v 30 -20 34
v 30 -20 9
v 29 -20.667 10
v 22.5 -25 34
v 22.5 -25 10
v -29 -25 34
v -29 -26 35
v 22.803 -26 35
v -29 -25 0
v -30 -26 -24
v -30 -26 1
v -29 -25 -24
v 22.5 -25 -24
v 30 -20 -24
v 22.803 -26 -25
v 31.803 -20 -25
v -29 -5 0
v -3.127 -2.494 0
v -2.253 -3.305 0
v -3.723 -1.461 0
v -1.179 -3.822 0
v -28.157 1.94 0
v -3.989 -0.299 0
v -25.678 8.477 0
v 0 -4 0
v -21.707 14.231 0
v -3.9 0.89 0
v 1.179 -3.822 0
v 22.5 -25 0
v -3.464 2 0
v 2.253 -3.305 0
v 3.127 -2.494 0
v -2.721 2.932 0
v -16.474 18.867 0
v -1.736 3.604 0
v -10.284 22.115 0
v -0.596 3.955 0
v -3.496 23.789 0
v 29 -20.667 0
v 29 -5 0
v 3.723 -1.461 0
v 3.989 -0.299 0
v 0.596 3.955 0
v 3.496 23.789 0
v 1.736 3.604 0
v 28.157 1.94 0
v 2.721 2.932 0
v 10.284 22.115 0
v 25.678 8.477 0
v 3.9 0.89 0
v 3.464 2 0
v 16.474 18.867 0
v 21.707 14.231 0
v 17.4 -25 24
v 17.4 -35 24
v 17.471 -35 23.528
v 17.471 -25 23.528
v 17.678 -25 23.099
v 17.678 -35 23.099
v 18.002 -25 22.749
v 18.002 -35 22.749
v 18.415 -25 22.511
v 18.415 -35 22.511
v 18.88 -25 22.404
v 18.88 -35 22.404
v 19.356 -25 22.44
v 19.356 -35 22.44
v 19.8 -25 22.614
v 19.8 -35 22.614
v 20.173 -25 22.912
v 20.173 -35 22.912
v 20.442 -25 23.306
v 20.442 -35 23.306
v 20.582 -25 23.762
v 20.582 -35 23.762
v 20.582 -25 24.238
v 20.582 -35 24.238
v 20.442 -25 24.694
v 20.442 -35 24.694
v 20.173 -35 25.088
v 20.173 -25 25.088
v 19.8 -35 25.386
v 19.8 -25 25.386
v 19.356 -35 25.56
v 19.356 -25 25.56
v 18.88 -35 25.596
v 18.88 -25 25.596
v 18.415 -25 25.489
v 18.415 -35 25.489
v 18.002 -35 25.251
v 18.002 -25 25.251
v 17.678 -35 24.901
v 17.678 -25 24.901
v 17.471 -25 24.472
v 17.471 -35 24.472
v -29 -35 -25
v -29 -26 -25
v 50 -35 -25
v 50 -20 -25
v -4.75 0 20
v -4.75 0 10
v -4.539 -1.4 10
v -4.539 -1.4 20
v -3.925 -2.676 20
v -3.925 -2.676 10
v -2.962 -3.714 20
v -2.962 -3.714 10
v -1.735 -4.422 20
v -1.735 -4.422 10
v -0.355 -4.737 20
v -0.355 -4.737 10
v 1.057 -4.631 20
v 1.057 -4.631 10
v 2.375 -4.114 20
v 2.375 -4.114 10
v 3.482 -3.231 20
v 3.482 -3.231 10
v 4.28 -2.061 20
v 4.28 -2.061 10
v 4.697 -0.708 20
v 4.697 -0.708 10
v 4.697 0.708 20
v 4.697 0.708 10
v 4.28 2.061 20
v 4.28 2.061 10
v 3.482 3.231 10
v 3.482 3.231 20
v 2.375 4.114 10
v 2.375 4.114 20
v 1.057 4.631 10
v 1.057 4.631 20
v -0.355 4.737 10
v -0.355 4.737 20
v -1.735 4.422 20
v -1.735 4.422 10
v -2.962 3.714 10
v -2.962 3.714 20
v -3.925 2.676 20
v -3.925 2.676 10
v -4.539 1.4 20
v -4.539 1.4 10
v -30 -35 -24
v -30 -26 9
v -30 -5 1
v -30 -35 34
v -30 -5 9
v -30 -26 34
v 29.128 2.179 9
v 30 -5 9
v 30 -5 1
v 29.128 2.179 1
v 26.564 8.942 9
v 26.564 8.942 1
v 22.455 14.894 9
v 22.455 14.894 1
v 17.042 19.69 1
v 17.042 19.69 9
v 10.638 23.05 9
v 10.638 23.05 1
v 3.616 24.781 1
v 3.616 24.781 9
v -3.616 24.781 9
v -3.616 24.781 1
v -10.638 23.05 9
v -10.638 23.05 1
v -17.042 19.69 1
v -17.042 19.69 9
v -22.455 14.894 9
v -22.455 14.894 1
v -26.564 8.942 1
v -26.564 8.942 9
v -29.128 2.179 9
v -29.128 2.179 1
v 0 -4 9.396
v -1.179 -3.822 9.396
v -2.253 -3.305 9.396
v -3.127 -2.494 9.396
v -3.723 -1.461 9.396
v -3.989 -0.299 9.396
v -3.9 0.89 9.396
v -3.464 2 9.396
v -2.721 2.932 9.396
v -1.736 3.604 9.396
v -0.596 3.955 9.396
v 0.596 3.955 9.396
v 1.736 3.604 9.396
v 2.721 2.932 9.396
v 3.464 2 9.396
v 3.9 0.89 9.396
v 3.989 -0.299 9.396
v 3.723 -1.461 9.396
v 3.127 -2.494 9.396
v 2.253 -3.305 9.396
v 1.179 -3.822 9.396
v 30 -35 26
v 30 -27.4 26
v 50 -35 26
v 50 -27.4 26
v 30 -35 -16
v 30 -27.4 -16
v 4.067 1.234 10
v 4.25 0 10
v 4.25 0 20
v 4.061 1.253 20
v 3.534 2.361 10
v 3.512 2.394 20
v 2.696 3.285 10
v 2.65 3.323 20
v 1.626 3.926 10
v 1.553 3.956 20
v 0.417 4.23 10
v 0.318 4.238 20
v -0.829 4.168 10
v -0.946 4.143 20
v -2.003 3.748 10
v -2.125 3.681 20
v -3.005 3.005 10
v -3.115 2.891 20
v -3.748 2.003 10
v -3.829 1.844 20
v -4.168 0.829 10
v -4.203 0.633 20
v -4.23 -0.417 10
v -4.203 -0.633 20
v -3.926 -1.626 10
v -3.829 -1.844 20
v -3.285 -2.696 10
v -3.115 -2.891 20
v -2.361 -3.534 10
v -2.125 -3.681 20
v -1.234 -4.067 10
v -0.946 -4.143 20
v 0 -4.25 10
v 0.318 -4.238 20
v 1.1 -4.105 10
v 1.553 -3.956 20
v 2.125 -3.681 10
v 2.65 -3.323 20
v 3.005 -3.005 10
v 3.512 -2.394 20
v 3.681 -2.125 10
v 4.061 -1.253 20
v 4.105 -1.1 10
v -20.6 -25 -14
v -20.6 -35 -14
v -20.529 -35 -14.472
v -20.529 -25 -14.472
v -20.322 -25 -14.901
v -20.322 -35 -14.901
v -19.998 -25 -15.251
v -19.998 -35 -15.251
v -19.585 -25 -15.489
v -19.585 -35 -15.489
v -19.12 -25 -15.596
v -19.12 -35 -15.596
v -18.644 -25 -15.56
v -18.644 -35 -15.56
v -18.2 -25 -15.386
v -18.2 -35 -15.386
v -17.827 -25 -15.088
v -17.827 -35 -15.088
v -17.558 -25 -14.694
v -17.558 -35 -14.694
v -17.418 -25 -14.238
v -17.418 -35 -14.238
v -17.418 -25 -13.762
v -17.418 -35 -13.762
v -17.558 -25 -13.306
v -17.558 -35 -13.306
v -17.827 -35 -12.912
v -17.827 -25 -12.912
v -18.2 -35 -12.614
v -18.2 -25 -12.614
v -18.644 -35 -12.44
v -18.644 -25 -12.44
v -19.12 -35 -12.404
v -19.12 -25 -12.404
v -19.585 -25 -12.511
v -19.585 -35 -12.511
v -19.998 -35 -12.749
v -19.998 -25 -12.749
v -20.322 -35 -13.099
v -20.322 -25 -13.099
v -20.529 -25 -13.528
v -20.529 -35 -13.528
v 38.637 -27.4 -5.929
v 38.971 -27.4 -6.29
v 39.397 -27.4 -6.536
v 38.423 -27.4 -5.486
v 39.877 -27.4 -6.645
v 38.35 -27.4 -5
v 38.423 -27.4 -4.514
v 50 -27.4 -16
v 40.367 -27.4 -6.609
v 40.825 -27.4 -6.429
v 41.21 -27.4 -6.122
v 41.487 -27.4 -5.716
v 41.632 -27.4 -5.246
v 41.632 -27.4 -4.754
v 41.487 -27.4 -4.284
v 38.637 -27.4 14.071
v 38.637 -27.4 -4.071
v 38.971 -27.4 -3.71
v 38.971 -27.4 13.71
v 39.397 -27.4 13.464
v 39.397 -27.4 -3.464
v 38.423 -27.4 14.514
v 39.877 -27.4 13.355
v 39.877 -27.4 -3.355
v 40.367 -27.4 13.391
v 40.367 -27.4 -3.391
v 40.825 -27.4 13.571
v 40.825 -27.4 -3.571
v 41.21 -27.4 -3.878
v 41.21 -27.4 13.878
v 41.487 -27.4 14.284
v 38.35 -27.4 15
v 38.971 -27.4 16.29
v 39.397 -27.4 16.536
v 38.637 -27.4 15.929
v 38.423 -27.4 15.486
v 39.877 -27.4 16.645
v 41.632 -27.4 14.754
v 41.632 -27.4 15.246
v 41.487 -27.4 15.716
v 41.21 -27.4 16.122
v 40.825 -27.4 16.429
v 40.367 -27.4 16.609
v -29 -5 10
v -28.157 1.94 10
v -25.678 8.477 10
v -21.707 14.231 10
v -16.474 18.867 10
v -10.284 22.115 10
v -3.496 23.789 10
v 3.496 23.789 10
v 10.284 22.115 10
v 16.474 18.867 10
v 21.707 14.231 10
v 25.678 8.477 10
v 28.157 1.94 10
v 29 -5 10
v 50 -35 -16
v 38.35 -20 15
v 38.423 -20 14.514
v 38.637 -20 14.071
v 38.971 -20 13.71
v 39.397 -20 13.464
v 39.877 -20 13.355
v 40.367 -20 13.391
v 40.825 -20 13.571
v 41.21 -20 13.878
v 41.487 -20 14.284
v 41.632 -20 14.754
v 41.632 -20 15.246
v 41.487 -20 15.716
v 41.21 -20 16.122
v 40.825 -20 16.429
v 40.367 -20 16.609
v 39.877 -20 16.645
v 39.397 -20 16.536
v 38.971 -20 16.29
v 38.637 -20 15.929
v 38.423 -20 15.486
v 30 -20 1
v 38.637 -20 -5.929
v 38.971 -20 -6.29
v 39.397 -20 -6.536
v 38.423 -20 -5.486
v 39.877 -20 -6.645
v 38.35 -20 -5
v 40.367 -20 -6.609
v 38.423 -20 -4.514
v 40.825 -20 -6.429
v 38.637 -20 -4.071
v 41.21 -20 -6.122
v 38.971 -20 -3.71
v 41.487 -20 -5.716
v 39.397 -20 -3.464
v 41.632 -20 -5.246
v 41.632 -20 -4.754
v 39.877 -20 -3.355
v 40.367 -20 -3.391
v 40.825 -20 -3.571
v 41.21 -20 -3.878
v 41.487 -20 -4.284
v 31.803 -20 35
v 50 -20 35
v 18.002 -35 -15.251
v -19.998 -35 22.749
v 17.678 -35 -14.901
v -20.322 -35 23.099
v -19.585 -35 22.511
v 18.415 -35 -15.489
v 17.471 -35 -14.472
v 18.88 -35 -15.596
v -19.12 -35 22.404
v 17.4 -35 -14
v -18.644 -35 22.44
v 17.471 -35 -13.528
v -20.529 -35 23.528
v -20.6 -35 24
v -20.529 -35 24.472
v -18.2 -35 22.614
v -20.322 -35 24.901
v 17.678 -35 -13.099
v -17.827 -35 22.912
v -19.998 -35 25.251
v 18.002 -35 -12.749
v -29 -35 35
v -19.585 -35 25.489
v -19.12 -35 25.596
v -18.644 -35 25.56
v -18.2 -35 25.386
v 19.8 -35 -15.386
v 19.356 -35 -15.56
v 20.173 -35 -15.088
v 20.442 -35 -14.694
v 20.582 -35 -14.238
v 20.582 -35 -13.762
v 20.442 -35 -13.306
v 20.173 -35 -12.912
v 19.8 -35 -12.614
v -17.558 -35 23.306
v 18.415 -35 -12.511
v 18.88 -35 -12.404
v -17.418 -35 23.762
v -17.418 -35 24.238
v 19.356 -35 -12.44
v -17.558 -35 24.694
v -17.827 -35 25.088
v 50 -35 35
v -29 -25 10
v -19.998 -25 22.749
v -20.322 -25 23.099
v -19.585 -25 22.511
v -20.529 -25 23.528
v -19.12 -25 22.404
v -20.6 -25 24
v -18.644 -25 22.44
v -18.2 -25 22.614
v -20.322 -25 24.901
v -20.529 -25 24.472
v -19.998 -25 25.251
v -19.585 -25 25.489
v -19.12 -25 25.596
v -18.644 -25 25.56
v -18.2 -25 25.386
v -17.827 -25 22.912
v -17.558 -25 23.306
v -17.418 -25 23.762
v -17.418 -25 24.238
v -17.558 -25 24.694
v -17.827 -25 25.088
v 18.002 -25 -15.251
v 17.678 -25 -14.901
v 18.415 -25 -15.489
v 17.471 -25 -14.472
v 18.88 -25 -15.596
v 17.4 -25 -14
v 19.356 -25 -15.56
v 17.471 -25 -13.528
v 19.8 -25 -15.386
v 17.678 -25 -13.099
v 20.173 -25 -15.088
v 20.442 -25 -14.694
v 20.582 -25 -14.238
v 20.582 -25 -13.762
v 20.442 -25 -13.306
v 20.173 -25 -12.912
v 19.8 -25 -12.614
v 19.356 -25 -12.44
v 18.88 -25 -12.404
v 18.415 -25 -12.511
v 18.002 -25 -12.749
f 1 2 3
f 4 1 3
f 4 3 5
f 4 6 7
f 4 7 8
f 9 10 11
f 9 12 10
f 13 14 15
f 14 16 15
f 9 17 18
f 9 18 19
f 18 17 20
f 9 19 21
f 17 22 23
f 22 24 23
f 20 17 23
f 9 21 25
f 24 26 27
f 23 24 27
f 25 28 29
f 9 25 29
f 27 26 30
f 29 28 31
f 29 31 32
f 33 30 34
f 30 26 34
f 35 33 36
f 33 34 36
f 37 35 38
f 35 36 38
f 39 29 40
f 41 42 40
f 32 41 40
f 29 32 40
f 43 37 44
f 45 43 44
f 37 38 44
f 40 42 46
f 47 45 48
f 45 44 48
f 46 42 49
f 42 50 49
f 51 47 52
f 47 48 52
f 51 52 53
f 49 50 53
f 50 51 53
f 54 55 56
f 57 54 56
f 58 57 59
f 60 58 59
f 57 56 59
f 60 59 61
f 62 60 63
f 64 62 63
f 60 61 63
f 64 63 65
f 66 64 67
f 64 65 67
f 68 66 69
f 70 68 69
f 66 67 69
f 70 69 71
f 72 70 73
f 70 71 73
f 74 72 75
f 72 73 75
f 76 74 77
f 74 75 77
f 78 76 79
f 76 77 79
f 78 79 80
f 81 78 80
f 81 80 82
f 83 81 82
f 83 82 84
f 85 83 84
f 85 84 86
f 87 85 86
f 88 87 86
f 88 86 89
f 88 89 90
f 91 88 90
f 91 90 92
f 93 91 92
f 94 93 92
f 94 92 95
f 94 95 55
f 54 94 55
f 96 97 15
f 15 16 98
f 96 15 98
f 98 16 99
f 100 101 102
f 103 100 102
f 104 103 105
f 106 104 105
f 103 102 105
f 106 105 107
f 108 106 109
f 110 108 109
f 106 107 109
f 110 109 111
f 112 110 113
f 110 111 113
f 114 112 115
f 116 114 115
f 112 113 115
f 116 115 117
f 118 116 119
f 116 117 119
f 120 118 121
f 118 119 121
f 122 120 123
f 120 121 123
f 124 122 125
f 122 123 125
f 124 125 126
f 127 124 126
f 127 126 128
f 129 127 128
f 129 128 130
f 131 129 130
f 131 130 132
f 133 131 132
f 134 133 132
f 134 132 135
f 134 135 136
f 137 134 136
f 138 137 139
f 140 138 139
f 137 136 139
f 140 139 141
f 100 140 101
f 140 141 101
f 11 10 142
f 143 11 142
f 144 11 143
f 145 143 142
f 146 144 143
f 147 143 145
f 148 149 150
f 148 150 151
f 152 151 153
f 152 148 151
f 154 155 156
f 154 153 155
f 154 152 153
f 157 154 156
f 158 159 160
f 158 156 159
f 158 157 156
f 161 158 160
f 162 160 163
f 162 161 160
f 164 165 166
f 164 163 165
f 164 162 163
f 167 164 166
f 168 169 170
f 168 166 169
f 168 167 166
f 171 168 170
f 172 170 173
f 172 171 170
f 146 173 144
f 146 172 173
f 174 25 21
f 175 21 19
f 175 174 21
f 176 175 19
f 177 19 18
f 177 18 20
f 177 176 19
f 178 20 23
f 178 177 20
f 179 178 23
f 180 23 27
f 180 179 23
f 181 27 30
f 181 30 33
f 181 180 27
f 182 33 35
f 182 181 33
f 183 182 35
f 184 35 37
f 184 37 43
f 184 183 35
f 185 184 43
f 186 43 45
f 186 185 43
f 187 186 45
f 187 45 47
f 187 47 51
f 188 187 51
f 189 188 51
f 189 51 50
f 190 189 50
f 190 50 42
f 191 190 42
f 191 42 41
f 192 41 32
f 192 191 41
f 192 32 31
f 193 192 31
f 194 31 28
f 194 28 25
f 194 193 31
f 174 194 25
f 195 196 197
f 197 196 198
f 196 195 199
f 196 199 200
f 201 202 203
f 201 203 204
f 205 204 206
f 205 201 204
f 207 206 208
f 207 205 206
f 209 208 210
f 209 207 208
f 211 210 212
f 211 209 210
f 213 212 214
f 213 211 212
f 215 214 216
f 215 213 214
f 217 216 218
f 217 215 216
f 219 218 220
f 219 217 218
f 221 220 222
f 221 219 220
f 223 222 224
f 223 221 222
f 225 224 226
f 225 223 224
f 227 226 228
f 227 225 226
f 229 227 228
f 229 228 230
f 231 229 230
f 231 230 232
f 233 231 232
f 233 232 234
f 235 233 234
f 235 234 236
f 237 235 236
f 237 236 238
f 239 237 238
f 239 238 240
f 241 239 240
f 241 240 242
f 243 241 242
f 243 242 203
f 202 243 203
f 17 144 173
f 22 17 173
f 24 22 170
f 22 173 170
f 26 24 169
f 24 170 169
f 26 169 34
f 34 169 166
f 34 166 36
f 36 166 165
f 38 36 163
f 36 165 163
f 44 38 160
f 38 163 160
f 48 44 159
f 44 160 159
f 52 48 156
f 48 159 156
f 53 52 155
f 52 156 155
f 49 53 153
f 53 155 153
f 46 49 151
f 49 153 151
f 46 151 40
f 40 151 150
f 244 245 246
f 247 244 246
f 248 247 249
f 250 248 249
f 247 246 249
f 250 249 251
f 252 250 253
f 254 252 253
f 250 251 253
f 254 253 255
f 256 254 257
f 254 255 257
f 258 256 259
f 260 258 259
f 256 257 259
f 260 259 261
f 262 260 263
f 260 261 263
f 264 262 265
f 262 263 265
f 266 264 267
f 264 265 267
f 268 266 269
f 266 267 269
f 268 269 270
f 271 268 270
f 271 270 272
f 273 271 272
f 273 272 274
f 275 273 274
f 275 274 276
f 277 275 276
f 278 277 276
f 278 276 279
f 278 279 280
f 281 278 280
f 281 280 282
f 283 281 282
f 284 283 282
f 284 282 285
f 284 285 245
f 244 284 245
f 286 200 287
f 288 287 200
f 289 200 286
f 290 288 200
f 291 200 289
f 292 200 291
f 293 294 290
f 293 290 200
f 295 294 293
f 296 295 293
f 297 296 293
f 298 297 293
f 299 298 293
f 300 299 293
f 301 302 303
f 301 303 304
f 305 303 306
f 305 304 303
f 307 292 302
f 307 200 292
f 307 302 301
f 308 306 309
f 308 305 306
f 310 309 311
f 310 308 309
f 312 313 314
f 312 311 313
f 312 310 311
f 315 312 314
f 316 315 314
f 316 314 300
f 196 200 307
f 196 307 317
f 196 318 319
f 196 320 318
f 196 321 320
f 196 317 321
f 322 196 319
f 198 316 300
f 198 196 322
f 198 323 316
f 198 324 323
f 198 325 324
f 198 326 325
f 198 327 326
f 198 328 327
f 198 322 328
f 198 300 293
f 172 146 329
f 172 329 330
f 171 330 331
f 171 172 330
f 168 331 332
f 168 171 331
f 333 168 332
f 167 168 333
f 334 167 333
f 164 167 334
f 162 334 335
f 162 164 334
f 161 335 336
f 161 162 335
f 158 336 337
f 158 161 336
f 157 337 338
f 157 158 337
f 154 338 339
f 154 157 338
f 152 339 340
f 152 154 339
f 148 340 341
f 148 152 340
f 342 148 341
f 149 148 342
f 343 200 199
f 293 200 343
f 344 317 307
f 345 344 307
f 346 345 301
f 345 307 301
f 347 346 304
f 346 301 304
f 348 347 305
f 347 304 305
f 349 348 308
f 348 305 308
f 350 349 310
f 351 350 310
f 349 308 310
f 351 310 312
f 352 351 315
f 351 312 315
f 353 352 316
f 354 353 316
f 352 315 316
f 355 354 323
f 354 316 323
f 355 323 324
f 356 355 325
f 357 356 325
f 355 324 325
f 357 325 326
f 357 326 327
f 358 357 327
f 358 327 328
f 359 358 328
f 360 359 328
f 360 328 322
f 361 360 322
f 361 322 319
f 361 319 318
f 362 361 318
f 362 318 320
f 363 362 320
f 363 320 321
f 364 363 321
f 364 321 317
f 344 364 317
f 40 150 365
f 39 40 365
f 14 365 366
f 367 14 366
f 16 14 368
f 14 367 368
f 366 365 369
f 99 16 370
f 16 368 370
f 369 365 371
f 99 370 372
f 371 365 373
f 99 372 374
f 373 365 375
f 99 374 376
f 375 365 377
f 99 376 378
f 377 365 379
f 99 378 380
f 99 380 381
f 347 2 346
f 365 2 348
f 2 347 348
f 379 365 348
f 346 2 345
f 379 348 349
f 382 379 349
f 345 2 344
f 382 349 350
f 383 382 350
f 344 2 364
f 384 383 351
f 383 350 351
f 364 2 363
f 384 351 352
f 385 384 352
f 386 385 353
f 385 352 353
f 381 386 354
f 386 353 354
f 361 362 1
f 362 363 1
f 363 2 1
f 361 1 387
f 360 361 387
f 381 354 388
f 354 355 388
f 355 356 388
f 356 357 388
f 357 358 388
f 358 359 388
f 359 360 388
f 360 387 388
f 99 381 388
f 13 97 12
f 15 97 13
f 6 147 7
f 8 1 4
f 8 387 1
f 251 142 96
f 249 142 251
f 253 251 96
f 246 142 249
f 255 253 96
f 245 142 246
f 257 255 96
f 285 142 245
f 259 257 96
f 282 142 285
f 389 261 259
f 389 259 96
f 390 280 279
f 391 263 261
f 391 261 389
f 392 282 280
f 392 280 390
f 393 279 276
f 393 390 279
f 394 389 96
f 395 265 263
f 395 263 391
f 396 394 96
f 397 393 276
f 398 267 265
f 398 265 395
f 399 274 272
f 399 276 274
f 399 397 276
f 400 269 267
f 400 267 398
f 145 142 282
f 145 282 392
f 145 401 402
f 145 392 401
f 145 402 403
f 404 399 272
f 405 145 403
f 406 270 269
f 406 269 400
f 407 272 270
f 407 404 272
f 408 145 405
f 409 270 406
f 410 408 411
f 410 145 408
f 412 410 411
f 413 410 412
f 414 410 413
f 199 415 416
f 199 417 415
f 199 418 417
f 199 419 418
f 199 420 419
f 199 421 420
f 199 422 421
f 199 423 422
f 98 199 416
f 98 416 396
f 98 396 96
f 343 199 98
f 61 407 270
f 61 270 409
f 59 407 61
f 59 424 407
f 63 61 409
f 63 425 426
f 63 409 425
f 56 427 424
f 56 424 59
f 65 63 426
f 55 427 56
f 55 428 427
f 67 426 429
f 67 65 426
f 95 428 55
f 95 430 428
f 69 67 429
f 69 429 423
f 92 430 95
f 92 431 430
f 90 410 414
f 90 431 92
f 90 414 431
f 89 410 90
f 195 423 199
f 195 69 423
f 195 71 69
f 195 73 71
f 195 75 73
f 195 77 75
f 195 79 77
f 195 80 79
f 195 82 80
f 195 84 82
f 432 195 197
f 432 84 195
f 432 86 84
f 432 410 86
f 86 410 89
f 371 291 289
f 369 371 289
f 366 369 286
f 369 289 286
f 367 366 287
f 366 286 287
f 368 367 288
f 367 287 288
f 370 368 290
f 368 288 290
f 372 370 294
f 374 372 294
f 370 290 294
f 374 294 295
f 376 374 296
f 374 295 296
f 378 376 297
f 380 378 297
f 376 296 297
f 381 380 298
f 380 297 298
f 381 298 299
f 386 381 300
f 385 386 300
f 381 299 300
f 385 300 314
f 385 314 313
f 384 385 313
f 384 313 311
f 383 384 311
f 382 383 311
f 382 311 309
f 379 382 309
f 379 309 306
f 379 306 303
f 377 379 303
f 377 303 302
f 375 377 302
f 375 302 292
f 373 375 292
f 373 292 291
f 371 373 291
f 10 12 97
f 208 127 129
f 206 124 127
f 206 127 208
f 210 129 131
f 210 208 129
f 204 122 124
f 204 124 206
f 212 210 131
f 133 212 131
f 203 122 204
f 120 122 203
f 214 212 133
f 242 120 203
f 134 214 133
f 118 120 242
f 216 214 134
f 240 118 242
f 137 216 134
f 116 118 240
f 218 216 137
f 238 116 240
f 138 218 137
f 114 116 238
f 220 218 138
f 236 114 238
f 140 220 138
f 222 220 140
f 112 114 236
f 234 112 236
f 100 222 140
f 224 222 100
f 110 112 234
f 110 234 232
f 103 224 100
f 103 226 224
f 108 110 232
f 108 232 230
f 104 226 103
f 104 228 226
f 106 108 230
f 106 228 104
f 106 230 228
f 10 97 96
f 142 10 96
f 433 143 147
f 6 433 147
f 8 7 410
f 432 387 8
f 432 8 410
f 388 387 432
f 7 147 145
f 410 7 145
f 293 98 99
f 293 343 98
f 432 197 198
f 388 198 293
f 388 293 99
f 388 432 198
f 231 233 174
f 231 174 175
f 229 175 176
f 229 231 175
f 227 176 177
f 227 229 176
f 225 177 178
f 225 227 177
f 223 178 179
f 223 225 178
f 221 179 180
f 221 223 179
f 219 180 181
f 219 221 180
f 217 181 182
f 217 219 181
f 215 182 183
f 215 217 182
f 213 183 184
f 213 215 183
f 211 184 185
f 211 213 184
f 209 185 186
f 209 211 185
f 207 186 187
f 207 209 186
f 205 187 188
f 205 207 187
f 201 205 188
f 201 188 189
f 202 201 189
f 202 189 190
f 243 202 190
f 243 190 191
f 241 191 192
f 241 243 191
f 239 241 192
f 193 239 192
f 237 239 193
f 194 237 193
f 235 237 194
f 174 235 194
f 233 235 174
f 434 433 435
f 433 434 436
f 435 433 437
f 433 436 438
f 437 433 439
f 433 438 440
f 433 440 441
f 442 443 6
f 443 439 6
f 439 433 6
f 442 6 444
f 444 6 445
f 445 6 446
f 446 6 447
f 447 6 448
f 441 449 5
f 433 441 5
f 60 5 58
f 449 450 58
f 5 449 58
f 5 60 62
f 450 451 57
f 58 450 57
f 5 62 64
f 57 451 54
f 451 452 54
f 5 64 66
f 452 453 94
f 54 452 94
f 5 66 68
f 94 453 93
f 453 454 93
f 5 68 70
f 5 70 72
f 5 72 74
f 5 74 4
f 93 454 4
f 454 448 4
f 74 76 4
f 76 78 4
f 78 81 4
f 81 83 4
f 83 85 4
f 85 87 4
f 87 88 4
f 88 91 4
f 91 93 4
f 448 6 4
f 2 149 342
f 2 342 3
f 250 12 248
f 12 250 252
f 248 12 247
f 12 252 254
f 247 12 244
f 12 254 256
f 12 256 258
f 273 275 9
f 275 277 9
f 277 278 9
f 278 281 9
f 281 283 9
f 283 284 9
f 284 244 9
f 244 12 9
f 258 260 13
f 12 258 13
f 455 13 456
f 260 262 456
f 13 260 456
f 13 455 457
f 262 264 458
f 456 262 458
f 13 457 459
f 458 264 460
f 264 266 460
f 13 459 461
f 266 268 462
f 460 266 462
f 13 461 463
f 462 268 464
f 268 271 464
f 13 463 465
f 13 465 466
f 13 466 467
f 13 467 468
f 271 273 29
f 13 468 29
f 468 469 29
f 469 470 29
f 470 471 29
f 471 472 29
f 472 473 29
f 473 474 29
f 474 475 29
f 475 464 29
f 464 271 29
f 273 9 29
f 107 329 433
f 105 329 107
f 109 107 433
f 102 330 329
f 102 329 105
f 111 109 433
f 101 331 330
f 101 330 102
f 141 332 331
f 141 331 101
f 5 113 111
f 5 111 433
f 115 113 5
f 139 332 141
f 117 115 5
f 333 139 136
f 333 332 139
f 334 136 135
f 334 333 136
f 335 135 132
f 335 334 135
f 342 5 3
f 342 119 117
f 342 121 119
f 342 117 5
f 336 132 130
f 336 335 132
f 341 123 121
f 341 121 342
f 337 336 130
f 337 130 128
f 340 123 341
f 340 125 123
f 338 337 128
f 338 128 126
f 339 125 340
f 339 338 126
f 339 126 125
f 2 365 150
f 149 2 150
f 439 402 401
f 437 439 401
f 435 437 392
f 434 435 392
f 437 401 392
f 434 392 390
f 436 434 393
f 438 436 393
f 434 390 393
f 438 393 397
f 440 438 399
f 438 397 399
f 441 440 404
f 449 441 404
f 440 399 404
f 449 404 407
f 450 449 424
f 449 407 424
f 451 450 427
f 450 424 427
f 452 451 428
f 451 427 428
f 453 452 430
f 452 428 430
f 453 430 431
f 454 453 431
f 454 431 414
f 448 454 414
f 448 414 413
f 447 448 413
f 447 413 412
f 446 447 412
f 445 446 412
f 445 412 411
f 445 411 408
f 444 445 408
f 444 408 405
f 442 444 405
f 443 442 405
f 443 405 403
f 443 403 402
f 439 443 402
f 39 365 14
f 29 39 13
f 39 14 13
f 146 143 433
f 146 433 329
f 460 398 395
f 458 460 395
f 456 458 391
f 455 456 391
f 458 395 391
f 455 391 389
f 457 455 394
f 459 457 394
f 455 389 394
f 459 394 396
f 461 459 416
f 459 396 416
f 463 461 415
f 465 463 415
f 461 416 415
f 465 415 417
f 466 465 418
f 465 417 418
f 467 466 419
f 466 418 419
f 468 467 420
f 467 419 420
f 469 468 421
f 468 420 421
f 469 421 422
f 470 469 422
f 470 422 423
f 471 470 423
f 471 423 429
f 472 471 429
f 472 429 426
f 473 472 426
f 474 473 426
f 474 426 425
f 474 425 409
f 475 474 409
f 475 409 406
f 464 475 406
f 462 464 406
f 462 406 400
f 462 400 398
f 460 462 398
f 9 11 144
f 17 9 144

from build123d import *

# Parameters (mm, degrees)
SKETCH_1_W          = 60
SKETCH_1_H          = 50
EXTRUDE_1_DEPTH     = 10
SKETCH_8_W          = 80
SKETCH_8_H          = 60
EXTRUDE_2_DEPTH     = 10
SKETCH_9_R          = 4.75
SKETCH_9_R_2        = 4.25
EXTRUDE_3_DEPTH     = 10
SKETCH_11_W         = 20
SKETCH_11_H         = 7.6
CUT_EXTRUDE_1_DEPTH = 21
SKETCH_12_W         = 20
SKETCH_12_H         = 5
EXTRUDE_4_DEPTH     = 30
HOLE_WIZARD_4_D     = 3.3
EXTRUDE_START       = -60
EXTRUDE_5_DEPTH     = 60
FILLET_1_RADIUS     = 30
FILLET_1_LENGTH     = 10
CHAMFER_1_SIZE      = 1
HOLE_WIZARD_5_D     = 3.2


with BuildPart() as part:
    # 草图1 → 凸台-拉伸1 (new body)
    with BuildSketch(Plane.XY):
        Rectangle(SKETCH_1_W, SKETCH_1_H)
    extrude(amount=EXTRUDE_1_DEPTH)

    # 草图3 → 孔1 (revolve, cut)
    with BuildSketch(Plane(origin=(0, 0, 10), x_dir=(0, -1, 0), z_dir=(1, 0, 0))):
        Polygon((0, 0), (0, 10), (4, 10), (4, 0.603553391), (4.25, 0), align=None)
    revolve(axis=Axis((0, 0, 16.445314094), (0, 0, -1)), mode=Mode.SUBTRACT)

    # 草图8 → 凸台-拉伸2 (add)
    with BuildSketch(Plane.XZ.offset(25)):
        with Locations((10, 5)):
            Rectangle(SKETCH_8_W, SKETCH_8_H)
    extrude(amount=EXTRUDE_2_DEPTH)

    # 草图9 → 凸台-拉伸3 (add)
    with BuildSketch(Plane.XY.offset(10)):
        with Locations(Location((0, 0, 0), (0, 0, 180))):
            Circle(SKETCH_9_R)
        Circle(SKETCH_9_R_2, mode=Mode.SUBTRACT)
    extrude(amount=EXTRUDE_3_DEPTH)

    # 草图11 → 切除-拉伸1 (cut, symmetric)
    with BuildSketch(Plane.XY.offset(5)):
        with Locations((40, -31.2)):
            Rectangle(SKETCH_11_W, SKETCH_11_H)
    extrude(amount=CUT_EXTRUDE_1_DEPTH, both=True, mode=Mode.SUBTRACT)

    # 草图12 → 凸台-拉伸4 (add, symmetric)
    with BuildSketch(Plane.XY.offset(5)):
        with Locations((40, -22.5)):
            Rectangle(SKETCH_12_W, SKETCH_12_H)
    extrude(amount=EXTRUDE_4_DEPTH, both=True)

    # 孔4 (through all)
    with Locations(Plane(origin=(0, -20, 0), x_dir=(1, 0, 0), z_dir=(0, 1, 0))):
        with Locations((40, -15), (40, 5)):
            Hole(HOLE_WIZARD_4_D / 2)

    # 草图15 → 凸台-拉伸5 (add)
    with BuildSketch(Plane.XY.offset(35).offset(EXTRUDE_START)):
        Polygon((30, -20), (22.5, -25), (30, -25), align=None)
    extrude(amount=EXTRUDE_5_DEPTH)

    # 圆角1: full round fillet: the end face becomes a half cylinder, R = half its width
    fillet_1_face = Plane((0, 25, 5), x_dir=(0, 0, 1), z_dir=(0, 1, 0))  # on the end face: x along it, z out of the body
    fillet_1_slab = fillet_1_face.offset(-FILLET_1_RADIUS / 2) * Box(FILLET_1_LENGTH, 2 * FILLET_1_RADIUS, FILLET_1_RADIUS, mode=Mode.PRIVATE)  # the body's end, R deep
    fillet_1_round = Plane((0, -5, 5), x_dir=(0, 1, 0), z_dir=(0, 0, 1)) * Cylinder(FILLET_1_RADIUS, FILLET_1_LENGTH, mode=Mode.PRIVATE)  # its axis R under the face
    add(fillet_1_slab - fillet_1_round, mode=Mode.SUBTRACT)

    # 倒角1
    chamfer_1_edges = [part.edges().sort_by_distance(p)[0] for p in [
        (26.25, -22.5, -25),
        (26.25, -22.5, 35),
        (-30, -15, 0),
        (-30, -15, 10),
        (0, 25, 10),
        (0, 25, 0),
        (-30, -25, 22.5),
        (-30, -25, -12.5),
        (-30, -30, 35),
        (-3.75, -25, -25),
        (-30, -30, -25),
        (30, -12.5, 0),
        (30, -12.5, 10),
        (-3.75, -25, 35),
    ]]
    chamfer(chamfer_1_edges, length=CHAMFER_1_SIZE)

    # 孔5 (through all)
    with Locations(Plane(origin=(0, -25, 0), x_dir=(1, 0, 0), z_dir=(0, 1, 0))):
        with Locations((-19, 14), (19, 14), (19, -24), (-19, -24)):
            Hole(HOLE_WIZARD_5_D / 2)


solid = part.part
